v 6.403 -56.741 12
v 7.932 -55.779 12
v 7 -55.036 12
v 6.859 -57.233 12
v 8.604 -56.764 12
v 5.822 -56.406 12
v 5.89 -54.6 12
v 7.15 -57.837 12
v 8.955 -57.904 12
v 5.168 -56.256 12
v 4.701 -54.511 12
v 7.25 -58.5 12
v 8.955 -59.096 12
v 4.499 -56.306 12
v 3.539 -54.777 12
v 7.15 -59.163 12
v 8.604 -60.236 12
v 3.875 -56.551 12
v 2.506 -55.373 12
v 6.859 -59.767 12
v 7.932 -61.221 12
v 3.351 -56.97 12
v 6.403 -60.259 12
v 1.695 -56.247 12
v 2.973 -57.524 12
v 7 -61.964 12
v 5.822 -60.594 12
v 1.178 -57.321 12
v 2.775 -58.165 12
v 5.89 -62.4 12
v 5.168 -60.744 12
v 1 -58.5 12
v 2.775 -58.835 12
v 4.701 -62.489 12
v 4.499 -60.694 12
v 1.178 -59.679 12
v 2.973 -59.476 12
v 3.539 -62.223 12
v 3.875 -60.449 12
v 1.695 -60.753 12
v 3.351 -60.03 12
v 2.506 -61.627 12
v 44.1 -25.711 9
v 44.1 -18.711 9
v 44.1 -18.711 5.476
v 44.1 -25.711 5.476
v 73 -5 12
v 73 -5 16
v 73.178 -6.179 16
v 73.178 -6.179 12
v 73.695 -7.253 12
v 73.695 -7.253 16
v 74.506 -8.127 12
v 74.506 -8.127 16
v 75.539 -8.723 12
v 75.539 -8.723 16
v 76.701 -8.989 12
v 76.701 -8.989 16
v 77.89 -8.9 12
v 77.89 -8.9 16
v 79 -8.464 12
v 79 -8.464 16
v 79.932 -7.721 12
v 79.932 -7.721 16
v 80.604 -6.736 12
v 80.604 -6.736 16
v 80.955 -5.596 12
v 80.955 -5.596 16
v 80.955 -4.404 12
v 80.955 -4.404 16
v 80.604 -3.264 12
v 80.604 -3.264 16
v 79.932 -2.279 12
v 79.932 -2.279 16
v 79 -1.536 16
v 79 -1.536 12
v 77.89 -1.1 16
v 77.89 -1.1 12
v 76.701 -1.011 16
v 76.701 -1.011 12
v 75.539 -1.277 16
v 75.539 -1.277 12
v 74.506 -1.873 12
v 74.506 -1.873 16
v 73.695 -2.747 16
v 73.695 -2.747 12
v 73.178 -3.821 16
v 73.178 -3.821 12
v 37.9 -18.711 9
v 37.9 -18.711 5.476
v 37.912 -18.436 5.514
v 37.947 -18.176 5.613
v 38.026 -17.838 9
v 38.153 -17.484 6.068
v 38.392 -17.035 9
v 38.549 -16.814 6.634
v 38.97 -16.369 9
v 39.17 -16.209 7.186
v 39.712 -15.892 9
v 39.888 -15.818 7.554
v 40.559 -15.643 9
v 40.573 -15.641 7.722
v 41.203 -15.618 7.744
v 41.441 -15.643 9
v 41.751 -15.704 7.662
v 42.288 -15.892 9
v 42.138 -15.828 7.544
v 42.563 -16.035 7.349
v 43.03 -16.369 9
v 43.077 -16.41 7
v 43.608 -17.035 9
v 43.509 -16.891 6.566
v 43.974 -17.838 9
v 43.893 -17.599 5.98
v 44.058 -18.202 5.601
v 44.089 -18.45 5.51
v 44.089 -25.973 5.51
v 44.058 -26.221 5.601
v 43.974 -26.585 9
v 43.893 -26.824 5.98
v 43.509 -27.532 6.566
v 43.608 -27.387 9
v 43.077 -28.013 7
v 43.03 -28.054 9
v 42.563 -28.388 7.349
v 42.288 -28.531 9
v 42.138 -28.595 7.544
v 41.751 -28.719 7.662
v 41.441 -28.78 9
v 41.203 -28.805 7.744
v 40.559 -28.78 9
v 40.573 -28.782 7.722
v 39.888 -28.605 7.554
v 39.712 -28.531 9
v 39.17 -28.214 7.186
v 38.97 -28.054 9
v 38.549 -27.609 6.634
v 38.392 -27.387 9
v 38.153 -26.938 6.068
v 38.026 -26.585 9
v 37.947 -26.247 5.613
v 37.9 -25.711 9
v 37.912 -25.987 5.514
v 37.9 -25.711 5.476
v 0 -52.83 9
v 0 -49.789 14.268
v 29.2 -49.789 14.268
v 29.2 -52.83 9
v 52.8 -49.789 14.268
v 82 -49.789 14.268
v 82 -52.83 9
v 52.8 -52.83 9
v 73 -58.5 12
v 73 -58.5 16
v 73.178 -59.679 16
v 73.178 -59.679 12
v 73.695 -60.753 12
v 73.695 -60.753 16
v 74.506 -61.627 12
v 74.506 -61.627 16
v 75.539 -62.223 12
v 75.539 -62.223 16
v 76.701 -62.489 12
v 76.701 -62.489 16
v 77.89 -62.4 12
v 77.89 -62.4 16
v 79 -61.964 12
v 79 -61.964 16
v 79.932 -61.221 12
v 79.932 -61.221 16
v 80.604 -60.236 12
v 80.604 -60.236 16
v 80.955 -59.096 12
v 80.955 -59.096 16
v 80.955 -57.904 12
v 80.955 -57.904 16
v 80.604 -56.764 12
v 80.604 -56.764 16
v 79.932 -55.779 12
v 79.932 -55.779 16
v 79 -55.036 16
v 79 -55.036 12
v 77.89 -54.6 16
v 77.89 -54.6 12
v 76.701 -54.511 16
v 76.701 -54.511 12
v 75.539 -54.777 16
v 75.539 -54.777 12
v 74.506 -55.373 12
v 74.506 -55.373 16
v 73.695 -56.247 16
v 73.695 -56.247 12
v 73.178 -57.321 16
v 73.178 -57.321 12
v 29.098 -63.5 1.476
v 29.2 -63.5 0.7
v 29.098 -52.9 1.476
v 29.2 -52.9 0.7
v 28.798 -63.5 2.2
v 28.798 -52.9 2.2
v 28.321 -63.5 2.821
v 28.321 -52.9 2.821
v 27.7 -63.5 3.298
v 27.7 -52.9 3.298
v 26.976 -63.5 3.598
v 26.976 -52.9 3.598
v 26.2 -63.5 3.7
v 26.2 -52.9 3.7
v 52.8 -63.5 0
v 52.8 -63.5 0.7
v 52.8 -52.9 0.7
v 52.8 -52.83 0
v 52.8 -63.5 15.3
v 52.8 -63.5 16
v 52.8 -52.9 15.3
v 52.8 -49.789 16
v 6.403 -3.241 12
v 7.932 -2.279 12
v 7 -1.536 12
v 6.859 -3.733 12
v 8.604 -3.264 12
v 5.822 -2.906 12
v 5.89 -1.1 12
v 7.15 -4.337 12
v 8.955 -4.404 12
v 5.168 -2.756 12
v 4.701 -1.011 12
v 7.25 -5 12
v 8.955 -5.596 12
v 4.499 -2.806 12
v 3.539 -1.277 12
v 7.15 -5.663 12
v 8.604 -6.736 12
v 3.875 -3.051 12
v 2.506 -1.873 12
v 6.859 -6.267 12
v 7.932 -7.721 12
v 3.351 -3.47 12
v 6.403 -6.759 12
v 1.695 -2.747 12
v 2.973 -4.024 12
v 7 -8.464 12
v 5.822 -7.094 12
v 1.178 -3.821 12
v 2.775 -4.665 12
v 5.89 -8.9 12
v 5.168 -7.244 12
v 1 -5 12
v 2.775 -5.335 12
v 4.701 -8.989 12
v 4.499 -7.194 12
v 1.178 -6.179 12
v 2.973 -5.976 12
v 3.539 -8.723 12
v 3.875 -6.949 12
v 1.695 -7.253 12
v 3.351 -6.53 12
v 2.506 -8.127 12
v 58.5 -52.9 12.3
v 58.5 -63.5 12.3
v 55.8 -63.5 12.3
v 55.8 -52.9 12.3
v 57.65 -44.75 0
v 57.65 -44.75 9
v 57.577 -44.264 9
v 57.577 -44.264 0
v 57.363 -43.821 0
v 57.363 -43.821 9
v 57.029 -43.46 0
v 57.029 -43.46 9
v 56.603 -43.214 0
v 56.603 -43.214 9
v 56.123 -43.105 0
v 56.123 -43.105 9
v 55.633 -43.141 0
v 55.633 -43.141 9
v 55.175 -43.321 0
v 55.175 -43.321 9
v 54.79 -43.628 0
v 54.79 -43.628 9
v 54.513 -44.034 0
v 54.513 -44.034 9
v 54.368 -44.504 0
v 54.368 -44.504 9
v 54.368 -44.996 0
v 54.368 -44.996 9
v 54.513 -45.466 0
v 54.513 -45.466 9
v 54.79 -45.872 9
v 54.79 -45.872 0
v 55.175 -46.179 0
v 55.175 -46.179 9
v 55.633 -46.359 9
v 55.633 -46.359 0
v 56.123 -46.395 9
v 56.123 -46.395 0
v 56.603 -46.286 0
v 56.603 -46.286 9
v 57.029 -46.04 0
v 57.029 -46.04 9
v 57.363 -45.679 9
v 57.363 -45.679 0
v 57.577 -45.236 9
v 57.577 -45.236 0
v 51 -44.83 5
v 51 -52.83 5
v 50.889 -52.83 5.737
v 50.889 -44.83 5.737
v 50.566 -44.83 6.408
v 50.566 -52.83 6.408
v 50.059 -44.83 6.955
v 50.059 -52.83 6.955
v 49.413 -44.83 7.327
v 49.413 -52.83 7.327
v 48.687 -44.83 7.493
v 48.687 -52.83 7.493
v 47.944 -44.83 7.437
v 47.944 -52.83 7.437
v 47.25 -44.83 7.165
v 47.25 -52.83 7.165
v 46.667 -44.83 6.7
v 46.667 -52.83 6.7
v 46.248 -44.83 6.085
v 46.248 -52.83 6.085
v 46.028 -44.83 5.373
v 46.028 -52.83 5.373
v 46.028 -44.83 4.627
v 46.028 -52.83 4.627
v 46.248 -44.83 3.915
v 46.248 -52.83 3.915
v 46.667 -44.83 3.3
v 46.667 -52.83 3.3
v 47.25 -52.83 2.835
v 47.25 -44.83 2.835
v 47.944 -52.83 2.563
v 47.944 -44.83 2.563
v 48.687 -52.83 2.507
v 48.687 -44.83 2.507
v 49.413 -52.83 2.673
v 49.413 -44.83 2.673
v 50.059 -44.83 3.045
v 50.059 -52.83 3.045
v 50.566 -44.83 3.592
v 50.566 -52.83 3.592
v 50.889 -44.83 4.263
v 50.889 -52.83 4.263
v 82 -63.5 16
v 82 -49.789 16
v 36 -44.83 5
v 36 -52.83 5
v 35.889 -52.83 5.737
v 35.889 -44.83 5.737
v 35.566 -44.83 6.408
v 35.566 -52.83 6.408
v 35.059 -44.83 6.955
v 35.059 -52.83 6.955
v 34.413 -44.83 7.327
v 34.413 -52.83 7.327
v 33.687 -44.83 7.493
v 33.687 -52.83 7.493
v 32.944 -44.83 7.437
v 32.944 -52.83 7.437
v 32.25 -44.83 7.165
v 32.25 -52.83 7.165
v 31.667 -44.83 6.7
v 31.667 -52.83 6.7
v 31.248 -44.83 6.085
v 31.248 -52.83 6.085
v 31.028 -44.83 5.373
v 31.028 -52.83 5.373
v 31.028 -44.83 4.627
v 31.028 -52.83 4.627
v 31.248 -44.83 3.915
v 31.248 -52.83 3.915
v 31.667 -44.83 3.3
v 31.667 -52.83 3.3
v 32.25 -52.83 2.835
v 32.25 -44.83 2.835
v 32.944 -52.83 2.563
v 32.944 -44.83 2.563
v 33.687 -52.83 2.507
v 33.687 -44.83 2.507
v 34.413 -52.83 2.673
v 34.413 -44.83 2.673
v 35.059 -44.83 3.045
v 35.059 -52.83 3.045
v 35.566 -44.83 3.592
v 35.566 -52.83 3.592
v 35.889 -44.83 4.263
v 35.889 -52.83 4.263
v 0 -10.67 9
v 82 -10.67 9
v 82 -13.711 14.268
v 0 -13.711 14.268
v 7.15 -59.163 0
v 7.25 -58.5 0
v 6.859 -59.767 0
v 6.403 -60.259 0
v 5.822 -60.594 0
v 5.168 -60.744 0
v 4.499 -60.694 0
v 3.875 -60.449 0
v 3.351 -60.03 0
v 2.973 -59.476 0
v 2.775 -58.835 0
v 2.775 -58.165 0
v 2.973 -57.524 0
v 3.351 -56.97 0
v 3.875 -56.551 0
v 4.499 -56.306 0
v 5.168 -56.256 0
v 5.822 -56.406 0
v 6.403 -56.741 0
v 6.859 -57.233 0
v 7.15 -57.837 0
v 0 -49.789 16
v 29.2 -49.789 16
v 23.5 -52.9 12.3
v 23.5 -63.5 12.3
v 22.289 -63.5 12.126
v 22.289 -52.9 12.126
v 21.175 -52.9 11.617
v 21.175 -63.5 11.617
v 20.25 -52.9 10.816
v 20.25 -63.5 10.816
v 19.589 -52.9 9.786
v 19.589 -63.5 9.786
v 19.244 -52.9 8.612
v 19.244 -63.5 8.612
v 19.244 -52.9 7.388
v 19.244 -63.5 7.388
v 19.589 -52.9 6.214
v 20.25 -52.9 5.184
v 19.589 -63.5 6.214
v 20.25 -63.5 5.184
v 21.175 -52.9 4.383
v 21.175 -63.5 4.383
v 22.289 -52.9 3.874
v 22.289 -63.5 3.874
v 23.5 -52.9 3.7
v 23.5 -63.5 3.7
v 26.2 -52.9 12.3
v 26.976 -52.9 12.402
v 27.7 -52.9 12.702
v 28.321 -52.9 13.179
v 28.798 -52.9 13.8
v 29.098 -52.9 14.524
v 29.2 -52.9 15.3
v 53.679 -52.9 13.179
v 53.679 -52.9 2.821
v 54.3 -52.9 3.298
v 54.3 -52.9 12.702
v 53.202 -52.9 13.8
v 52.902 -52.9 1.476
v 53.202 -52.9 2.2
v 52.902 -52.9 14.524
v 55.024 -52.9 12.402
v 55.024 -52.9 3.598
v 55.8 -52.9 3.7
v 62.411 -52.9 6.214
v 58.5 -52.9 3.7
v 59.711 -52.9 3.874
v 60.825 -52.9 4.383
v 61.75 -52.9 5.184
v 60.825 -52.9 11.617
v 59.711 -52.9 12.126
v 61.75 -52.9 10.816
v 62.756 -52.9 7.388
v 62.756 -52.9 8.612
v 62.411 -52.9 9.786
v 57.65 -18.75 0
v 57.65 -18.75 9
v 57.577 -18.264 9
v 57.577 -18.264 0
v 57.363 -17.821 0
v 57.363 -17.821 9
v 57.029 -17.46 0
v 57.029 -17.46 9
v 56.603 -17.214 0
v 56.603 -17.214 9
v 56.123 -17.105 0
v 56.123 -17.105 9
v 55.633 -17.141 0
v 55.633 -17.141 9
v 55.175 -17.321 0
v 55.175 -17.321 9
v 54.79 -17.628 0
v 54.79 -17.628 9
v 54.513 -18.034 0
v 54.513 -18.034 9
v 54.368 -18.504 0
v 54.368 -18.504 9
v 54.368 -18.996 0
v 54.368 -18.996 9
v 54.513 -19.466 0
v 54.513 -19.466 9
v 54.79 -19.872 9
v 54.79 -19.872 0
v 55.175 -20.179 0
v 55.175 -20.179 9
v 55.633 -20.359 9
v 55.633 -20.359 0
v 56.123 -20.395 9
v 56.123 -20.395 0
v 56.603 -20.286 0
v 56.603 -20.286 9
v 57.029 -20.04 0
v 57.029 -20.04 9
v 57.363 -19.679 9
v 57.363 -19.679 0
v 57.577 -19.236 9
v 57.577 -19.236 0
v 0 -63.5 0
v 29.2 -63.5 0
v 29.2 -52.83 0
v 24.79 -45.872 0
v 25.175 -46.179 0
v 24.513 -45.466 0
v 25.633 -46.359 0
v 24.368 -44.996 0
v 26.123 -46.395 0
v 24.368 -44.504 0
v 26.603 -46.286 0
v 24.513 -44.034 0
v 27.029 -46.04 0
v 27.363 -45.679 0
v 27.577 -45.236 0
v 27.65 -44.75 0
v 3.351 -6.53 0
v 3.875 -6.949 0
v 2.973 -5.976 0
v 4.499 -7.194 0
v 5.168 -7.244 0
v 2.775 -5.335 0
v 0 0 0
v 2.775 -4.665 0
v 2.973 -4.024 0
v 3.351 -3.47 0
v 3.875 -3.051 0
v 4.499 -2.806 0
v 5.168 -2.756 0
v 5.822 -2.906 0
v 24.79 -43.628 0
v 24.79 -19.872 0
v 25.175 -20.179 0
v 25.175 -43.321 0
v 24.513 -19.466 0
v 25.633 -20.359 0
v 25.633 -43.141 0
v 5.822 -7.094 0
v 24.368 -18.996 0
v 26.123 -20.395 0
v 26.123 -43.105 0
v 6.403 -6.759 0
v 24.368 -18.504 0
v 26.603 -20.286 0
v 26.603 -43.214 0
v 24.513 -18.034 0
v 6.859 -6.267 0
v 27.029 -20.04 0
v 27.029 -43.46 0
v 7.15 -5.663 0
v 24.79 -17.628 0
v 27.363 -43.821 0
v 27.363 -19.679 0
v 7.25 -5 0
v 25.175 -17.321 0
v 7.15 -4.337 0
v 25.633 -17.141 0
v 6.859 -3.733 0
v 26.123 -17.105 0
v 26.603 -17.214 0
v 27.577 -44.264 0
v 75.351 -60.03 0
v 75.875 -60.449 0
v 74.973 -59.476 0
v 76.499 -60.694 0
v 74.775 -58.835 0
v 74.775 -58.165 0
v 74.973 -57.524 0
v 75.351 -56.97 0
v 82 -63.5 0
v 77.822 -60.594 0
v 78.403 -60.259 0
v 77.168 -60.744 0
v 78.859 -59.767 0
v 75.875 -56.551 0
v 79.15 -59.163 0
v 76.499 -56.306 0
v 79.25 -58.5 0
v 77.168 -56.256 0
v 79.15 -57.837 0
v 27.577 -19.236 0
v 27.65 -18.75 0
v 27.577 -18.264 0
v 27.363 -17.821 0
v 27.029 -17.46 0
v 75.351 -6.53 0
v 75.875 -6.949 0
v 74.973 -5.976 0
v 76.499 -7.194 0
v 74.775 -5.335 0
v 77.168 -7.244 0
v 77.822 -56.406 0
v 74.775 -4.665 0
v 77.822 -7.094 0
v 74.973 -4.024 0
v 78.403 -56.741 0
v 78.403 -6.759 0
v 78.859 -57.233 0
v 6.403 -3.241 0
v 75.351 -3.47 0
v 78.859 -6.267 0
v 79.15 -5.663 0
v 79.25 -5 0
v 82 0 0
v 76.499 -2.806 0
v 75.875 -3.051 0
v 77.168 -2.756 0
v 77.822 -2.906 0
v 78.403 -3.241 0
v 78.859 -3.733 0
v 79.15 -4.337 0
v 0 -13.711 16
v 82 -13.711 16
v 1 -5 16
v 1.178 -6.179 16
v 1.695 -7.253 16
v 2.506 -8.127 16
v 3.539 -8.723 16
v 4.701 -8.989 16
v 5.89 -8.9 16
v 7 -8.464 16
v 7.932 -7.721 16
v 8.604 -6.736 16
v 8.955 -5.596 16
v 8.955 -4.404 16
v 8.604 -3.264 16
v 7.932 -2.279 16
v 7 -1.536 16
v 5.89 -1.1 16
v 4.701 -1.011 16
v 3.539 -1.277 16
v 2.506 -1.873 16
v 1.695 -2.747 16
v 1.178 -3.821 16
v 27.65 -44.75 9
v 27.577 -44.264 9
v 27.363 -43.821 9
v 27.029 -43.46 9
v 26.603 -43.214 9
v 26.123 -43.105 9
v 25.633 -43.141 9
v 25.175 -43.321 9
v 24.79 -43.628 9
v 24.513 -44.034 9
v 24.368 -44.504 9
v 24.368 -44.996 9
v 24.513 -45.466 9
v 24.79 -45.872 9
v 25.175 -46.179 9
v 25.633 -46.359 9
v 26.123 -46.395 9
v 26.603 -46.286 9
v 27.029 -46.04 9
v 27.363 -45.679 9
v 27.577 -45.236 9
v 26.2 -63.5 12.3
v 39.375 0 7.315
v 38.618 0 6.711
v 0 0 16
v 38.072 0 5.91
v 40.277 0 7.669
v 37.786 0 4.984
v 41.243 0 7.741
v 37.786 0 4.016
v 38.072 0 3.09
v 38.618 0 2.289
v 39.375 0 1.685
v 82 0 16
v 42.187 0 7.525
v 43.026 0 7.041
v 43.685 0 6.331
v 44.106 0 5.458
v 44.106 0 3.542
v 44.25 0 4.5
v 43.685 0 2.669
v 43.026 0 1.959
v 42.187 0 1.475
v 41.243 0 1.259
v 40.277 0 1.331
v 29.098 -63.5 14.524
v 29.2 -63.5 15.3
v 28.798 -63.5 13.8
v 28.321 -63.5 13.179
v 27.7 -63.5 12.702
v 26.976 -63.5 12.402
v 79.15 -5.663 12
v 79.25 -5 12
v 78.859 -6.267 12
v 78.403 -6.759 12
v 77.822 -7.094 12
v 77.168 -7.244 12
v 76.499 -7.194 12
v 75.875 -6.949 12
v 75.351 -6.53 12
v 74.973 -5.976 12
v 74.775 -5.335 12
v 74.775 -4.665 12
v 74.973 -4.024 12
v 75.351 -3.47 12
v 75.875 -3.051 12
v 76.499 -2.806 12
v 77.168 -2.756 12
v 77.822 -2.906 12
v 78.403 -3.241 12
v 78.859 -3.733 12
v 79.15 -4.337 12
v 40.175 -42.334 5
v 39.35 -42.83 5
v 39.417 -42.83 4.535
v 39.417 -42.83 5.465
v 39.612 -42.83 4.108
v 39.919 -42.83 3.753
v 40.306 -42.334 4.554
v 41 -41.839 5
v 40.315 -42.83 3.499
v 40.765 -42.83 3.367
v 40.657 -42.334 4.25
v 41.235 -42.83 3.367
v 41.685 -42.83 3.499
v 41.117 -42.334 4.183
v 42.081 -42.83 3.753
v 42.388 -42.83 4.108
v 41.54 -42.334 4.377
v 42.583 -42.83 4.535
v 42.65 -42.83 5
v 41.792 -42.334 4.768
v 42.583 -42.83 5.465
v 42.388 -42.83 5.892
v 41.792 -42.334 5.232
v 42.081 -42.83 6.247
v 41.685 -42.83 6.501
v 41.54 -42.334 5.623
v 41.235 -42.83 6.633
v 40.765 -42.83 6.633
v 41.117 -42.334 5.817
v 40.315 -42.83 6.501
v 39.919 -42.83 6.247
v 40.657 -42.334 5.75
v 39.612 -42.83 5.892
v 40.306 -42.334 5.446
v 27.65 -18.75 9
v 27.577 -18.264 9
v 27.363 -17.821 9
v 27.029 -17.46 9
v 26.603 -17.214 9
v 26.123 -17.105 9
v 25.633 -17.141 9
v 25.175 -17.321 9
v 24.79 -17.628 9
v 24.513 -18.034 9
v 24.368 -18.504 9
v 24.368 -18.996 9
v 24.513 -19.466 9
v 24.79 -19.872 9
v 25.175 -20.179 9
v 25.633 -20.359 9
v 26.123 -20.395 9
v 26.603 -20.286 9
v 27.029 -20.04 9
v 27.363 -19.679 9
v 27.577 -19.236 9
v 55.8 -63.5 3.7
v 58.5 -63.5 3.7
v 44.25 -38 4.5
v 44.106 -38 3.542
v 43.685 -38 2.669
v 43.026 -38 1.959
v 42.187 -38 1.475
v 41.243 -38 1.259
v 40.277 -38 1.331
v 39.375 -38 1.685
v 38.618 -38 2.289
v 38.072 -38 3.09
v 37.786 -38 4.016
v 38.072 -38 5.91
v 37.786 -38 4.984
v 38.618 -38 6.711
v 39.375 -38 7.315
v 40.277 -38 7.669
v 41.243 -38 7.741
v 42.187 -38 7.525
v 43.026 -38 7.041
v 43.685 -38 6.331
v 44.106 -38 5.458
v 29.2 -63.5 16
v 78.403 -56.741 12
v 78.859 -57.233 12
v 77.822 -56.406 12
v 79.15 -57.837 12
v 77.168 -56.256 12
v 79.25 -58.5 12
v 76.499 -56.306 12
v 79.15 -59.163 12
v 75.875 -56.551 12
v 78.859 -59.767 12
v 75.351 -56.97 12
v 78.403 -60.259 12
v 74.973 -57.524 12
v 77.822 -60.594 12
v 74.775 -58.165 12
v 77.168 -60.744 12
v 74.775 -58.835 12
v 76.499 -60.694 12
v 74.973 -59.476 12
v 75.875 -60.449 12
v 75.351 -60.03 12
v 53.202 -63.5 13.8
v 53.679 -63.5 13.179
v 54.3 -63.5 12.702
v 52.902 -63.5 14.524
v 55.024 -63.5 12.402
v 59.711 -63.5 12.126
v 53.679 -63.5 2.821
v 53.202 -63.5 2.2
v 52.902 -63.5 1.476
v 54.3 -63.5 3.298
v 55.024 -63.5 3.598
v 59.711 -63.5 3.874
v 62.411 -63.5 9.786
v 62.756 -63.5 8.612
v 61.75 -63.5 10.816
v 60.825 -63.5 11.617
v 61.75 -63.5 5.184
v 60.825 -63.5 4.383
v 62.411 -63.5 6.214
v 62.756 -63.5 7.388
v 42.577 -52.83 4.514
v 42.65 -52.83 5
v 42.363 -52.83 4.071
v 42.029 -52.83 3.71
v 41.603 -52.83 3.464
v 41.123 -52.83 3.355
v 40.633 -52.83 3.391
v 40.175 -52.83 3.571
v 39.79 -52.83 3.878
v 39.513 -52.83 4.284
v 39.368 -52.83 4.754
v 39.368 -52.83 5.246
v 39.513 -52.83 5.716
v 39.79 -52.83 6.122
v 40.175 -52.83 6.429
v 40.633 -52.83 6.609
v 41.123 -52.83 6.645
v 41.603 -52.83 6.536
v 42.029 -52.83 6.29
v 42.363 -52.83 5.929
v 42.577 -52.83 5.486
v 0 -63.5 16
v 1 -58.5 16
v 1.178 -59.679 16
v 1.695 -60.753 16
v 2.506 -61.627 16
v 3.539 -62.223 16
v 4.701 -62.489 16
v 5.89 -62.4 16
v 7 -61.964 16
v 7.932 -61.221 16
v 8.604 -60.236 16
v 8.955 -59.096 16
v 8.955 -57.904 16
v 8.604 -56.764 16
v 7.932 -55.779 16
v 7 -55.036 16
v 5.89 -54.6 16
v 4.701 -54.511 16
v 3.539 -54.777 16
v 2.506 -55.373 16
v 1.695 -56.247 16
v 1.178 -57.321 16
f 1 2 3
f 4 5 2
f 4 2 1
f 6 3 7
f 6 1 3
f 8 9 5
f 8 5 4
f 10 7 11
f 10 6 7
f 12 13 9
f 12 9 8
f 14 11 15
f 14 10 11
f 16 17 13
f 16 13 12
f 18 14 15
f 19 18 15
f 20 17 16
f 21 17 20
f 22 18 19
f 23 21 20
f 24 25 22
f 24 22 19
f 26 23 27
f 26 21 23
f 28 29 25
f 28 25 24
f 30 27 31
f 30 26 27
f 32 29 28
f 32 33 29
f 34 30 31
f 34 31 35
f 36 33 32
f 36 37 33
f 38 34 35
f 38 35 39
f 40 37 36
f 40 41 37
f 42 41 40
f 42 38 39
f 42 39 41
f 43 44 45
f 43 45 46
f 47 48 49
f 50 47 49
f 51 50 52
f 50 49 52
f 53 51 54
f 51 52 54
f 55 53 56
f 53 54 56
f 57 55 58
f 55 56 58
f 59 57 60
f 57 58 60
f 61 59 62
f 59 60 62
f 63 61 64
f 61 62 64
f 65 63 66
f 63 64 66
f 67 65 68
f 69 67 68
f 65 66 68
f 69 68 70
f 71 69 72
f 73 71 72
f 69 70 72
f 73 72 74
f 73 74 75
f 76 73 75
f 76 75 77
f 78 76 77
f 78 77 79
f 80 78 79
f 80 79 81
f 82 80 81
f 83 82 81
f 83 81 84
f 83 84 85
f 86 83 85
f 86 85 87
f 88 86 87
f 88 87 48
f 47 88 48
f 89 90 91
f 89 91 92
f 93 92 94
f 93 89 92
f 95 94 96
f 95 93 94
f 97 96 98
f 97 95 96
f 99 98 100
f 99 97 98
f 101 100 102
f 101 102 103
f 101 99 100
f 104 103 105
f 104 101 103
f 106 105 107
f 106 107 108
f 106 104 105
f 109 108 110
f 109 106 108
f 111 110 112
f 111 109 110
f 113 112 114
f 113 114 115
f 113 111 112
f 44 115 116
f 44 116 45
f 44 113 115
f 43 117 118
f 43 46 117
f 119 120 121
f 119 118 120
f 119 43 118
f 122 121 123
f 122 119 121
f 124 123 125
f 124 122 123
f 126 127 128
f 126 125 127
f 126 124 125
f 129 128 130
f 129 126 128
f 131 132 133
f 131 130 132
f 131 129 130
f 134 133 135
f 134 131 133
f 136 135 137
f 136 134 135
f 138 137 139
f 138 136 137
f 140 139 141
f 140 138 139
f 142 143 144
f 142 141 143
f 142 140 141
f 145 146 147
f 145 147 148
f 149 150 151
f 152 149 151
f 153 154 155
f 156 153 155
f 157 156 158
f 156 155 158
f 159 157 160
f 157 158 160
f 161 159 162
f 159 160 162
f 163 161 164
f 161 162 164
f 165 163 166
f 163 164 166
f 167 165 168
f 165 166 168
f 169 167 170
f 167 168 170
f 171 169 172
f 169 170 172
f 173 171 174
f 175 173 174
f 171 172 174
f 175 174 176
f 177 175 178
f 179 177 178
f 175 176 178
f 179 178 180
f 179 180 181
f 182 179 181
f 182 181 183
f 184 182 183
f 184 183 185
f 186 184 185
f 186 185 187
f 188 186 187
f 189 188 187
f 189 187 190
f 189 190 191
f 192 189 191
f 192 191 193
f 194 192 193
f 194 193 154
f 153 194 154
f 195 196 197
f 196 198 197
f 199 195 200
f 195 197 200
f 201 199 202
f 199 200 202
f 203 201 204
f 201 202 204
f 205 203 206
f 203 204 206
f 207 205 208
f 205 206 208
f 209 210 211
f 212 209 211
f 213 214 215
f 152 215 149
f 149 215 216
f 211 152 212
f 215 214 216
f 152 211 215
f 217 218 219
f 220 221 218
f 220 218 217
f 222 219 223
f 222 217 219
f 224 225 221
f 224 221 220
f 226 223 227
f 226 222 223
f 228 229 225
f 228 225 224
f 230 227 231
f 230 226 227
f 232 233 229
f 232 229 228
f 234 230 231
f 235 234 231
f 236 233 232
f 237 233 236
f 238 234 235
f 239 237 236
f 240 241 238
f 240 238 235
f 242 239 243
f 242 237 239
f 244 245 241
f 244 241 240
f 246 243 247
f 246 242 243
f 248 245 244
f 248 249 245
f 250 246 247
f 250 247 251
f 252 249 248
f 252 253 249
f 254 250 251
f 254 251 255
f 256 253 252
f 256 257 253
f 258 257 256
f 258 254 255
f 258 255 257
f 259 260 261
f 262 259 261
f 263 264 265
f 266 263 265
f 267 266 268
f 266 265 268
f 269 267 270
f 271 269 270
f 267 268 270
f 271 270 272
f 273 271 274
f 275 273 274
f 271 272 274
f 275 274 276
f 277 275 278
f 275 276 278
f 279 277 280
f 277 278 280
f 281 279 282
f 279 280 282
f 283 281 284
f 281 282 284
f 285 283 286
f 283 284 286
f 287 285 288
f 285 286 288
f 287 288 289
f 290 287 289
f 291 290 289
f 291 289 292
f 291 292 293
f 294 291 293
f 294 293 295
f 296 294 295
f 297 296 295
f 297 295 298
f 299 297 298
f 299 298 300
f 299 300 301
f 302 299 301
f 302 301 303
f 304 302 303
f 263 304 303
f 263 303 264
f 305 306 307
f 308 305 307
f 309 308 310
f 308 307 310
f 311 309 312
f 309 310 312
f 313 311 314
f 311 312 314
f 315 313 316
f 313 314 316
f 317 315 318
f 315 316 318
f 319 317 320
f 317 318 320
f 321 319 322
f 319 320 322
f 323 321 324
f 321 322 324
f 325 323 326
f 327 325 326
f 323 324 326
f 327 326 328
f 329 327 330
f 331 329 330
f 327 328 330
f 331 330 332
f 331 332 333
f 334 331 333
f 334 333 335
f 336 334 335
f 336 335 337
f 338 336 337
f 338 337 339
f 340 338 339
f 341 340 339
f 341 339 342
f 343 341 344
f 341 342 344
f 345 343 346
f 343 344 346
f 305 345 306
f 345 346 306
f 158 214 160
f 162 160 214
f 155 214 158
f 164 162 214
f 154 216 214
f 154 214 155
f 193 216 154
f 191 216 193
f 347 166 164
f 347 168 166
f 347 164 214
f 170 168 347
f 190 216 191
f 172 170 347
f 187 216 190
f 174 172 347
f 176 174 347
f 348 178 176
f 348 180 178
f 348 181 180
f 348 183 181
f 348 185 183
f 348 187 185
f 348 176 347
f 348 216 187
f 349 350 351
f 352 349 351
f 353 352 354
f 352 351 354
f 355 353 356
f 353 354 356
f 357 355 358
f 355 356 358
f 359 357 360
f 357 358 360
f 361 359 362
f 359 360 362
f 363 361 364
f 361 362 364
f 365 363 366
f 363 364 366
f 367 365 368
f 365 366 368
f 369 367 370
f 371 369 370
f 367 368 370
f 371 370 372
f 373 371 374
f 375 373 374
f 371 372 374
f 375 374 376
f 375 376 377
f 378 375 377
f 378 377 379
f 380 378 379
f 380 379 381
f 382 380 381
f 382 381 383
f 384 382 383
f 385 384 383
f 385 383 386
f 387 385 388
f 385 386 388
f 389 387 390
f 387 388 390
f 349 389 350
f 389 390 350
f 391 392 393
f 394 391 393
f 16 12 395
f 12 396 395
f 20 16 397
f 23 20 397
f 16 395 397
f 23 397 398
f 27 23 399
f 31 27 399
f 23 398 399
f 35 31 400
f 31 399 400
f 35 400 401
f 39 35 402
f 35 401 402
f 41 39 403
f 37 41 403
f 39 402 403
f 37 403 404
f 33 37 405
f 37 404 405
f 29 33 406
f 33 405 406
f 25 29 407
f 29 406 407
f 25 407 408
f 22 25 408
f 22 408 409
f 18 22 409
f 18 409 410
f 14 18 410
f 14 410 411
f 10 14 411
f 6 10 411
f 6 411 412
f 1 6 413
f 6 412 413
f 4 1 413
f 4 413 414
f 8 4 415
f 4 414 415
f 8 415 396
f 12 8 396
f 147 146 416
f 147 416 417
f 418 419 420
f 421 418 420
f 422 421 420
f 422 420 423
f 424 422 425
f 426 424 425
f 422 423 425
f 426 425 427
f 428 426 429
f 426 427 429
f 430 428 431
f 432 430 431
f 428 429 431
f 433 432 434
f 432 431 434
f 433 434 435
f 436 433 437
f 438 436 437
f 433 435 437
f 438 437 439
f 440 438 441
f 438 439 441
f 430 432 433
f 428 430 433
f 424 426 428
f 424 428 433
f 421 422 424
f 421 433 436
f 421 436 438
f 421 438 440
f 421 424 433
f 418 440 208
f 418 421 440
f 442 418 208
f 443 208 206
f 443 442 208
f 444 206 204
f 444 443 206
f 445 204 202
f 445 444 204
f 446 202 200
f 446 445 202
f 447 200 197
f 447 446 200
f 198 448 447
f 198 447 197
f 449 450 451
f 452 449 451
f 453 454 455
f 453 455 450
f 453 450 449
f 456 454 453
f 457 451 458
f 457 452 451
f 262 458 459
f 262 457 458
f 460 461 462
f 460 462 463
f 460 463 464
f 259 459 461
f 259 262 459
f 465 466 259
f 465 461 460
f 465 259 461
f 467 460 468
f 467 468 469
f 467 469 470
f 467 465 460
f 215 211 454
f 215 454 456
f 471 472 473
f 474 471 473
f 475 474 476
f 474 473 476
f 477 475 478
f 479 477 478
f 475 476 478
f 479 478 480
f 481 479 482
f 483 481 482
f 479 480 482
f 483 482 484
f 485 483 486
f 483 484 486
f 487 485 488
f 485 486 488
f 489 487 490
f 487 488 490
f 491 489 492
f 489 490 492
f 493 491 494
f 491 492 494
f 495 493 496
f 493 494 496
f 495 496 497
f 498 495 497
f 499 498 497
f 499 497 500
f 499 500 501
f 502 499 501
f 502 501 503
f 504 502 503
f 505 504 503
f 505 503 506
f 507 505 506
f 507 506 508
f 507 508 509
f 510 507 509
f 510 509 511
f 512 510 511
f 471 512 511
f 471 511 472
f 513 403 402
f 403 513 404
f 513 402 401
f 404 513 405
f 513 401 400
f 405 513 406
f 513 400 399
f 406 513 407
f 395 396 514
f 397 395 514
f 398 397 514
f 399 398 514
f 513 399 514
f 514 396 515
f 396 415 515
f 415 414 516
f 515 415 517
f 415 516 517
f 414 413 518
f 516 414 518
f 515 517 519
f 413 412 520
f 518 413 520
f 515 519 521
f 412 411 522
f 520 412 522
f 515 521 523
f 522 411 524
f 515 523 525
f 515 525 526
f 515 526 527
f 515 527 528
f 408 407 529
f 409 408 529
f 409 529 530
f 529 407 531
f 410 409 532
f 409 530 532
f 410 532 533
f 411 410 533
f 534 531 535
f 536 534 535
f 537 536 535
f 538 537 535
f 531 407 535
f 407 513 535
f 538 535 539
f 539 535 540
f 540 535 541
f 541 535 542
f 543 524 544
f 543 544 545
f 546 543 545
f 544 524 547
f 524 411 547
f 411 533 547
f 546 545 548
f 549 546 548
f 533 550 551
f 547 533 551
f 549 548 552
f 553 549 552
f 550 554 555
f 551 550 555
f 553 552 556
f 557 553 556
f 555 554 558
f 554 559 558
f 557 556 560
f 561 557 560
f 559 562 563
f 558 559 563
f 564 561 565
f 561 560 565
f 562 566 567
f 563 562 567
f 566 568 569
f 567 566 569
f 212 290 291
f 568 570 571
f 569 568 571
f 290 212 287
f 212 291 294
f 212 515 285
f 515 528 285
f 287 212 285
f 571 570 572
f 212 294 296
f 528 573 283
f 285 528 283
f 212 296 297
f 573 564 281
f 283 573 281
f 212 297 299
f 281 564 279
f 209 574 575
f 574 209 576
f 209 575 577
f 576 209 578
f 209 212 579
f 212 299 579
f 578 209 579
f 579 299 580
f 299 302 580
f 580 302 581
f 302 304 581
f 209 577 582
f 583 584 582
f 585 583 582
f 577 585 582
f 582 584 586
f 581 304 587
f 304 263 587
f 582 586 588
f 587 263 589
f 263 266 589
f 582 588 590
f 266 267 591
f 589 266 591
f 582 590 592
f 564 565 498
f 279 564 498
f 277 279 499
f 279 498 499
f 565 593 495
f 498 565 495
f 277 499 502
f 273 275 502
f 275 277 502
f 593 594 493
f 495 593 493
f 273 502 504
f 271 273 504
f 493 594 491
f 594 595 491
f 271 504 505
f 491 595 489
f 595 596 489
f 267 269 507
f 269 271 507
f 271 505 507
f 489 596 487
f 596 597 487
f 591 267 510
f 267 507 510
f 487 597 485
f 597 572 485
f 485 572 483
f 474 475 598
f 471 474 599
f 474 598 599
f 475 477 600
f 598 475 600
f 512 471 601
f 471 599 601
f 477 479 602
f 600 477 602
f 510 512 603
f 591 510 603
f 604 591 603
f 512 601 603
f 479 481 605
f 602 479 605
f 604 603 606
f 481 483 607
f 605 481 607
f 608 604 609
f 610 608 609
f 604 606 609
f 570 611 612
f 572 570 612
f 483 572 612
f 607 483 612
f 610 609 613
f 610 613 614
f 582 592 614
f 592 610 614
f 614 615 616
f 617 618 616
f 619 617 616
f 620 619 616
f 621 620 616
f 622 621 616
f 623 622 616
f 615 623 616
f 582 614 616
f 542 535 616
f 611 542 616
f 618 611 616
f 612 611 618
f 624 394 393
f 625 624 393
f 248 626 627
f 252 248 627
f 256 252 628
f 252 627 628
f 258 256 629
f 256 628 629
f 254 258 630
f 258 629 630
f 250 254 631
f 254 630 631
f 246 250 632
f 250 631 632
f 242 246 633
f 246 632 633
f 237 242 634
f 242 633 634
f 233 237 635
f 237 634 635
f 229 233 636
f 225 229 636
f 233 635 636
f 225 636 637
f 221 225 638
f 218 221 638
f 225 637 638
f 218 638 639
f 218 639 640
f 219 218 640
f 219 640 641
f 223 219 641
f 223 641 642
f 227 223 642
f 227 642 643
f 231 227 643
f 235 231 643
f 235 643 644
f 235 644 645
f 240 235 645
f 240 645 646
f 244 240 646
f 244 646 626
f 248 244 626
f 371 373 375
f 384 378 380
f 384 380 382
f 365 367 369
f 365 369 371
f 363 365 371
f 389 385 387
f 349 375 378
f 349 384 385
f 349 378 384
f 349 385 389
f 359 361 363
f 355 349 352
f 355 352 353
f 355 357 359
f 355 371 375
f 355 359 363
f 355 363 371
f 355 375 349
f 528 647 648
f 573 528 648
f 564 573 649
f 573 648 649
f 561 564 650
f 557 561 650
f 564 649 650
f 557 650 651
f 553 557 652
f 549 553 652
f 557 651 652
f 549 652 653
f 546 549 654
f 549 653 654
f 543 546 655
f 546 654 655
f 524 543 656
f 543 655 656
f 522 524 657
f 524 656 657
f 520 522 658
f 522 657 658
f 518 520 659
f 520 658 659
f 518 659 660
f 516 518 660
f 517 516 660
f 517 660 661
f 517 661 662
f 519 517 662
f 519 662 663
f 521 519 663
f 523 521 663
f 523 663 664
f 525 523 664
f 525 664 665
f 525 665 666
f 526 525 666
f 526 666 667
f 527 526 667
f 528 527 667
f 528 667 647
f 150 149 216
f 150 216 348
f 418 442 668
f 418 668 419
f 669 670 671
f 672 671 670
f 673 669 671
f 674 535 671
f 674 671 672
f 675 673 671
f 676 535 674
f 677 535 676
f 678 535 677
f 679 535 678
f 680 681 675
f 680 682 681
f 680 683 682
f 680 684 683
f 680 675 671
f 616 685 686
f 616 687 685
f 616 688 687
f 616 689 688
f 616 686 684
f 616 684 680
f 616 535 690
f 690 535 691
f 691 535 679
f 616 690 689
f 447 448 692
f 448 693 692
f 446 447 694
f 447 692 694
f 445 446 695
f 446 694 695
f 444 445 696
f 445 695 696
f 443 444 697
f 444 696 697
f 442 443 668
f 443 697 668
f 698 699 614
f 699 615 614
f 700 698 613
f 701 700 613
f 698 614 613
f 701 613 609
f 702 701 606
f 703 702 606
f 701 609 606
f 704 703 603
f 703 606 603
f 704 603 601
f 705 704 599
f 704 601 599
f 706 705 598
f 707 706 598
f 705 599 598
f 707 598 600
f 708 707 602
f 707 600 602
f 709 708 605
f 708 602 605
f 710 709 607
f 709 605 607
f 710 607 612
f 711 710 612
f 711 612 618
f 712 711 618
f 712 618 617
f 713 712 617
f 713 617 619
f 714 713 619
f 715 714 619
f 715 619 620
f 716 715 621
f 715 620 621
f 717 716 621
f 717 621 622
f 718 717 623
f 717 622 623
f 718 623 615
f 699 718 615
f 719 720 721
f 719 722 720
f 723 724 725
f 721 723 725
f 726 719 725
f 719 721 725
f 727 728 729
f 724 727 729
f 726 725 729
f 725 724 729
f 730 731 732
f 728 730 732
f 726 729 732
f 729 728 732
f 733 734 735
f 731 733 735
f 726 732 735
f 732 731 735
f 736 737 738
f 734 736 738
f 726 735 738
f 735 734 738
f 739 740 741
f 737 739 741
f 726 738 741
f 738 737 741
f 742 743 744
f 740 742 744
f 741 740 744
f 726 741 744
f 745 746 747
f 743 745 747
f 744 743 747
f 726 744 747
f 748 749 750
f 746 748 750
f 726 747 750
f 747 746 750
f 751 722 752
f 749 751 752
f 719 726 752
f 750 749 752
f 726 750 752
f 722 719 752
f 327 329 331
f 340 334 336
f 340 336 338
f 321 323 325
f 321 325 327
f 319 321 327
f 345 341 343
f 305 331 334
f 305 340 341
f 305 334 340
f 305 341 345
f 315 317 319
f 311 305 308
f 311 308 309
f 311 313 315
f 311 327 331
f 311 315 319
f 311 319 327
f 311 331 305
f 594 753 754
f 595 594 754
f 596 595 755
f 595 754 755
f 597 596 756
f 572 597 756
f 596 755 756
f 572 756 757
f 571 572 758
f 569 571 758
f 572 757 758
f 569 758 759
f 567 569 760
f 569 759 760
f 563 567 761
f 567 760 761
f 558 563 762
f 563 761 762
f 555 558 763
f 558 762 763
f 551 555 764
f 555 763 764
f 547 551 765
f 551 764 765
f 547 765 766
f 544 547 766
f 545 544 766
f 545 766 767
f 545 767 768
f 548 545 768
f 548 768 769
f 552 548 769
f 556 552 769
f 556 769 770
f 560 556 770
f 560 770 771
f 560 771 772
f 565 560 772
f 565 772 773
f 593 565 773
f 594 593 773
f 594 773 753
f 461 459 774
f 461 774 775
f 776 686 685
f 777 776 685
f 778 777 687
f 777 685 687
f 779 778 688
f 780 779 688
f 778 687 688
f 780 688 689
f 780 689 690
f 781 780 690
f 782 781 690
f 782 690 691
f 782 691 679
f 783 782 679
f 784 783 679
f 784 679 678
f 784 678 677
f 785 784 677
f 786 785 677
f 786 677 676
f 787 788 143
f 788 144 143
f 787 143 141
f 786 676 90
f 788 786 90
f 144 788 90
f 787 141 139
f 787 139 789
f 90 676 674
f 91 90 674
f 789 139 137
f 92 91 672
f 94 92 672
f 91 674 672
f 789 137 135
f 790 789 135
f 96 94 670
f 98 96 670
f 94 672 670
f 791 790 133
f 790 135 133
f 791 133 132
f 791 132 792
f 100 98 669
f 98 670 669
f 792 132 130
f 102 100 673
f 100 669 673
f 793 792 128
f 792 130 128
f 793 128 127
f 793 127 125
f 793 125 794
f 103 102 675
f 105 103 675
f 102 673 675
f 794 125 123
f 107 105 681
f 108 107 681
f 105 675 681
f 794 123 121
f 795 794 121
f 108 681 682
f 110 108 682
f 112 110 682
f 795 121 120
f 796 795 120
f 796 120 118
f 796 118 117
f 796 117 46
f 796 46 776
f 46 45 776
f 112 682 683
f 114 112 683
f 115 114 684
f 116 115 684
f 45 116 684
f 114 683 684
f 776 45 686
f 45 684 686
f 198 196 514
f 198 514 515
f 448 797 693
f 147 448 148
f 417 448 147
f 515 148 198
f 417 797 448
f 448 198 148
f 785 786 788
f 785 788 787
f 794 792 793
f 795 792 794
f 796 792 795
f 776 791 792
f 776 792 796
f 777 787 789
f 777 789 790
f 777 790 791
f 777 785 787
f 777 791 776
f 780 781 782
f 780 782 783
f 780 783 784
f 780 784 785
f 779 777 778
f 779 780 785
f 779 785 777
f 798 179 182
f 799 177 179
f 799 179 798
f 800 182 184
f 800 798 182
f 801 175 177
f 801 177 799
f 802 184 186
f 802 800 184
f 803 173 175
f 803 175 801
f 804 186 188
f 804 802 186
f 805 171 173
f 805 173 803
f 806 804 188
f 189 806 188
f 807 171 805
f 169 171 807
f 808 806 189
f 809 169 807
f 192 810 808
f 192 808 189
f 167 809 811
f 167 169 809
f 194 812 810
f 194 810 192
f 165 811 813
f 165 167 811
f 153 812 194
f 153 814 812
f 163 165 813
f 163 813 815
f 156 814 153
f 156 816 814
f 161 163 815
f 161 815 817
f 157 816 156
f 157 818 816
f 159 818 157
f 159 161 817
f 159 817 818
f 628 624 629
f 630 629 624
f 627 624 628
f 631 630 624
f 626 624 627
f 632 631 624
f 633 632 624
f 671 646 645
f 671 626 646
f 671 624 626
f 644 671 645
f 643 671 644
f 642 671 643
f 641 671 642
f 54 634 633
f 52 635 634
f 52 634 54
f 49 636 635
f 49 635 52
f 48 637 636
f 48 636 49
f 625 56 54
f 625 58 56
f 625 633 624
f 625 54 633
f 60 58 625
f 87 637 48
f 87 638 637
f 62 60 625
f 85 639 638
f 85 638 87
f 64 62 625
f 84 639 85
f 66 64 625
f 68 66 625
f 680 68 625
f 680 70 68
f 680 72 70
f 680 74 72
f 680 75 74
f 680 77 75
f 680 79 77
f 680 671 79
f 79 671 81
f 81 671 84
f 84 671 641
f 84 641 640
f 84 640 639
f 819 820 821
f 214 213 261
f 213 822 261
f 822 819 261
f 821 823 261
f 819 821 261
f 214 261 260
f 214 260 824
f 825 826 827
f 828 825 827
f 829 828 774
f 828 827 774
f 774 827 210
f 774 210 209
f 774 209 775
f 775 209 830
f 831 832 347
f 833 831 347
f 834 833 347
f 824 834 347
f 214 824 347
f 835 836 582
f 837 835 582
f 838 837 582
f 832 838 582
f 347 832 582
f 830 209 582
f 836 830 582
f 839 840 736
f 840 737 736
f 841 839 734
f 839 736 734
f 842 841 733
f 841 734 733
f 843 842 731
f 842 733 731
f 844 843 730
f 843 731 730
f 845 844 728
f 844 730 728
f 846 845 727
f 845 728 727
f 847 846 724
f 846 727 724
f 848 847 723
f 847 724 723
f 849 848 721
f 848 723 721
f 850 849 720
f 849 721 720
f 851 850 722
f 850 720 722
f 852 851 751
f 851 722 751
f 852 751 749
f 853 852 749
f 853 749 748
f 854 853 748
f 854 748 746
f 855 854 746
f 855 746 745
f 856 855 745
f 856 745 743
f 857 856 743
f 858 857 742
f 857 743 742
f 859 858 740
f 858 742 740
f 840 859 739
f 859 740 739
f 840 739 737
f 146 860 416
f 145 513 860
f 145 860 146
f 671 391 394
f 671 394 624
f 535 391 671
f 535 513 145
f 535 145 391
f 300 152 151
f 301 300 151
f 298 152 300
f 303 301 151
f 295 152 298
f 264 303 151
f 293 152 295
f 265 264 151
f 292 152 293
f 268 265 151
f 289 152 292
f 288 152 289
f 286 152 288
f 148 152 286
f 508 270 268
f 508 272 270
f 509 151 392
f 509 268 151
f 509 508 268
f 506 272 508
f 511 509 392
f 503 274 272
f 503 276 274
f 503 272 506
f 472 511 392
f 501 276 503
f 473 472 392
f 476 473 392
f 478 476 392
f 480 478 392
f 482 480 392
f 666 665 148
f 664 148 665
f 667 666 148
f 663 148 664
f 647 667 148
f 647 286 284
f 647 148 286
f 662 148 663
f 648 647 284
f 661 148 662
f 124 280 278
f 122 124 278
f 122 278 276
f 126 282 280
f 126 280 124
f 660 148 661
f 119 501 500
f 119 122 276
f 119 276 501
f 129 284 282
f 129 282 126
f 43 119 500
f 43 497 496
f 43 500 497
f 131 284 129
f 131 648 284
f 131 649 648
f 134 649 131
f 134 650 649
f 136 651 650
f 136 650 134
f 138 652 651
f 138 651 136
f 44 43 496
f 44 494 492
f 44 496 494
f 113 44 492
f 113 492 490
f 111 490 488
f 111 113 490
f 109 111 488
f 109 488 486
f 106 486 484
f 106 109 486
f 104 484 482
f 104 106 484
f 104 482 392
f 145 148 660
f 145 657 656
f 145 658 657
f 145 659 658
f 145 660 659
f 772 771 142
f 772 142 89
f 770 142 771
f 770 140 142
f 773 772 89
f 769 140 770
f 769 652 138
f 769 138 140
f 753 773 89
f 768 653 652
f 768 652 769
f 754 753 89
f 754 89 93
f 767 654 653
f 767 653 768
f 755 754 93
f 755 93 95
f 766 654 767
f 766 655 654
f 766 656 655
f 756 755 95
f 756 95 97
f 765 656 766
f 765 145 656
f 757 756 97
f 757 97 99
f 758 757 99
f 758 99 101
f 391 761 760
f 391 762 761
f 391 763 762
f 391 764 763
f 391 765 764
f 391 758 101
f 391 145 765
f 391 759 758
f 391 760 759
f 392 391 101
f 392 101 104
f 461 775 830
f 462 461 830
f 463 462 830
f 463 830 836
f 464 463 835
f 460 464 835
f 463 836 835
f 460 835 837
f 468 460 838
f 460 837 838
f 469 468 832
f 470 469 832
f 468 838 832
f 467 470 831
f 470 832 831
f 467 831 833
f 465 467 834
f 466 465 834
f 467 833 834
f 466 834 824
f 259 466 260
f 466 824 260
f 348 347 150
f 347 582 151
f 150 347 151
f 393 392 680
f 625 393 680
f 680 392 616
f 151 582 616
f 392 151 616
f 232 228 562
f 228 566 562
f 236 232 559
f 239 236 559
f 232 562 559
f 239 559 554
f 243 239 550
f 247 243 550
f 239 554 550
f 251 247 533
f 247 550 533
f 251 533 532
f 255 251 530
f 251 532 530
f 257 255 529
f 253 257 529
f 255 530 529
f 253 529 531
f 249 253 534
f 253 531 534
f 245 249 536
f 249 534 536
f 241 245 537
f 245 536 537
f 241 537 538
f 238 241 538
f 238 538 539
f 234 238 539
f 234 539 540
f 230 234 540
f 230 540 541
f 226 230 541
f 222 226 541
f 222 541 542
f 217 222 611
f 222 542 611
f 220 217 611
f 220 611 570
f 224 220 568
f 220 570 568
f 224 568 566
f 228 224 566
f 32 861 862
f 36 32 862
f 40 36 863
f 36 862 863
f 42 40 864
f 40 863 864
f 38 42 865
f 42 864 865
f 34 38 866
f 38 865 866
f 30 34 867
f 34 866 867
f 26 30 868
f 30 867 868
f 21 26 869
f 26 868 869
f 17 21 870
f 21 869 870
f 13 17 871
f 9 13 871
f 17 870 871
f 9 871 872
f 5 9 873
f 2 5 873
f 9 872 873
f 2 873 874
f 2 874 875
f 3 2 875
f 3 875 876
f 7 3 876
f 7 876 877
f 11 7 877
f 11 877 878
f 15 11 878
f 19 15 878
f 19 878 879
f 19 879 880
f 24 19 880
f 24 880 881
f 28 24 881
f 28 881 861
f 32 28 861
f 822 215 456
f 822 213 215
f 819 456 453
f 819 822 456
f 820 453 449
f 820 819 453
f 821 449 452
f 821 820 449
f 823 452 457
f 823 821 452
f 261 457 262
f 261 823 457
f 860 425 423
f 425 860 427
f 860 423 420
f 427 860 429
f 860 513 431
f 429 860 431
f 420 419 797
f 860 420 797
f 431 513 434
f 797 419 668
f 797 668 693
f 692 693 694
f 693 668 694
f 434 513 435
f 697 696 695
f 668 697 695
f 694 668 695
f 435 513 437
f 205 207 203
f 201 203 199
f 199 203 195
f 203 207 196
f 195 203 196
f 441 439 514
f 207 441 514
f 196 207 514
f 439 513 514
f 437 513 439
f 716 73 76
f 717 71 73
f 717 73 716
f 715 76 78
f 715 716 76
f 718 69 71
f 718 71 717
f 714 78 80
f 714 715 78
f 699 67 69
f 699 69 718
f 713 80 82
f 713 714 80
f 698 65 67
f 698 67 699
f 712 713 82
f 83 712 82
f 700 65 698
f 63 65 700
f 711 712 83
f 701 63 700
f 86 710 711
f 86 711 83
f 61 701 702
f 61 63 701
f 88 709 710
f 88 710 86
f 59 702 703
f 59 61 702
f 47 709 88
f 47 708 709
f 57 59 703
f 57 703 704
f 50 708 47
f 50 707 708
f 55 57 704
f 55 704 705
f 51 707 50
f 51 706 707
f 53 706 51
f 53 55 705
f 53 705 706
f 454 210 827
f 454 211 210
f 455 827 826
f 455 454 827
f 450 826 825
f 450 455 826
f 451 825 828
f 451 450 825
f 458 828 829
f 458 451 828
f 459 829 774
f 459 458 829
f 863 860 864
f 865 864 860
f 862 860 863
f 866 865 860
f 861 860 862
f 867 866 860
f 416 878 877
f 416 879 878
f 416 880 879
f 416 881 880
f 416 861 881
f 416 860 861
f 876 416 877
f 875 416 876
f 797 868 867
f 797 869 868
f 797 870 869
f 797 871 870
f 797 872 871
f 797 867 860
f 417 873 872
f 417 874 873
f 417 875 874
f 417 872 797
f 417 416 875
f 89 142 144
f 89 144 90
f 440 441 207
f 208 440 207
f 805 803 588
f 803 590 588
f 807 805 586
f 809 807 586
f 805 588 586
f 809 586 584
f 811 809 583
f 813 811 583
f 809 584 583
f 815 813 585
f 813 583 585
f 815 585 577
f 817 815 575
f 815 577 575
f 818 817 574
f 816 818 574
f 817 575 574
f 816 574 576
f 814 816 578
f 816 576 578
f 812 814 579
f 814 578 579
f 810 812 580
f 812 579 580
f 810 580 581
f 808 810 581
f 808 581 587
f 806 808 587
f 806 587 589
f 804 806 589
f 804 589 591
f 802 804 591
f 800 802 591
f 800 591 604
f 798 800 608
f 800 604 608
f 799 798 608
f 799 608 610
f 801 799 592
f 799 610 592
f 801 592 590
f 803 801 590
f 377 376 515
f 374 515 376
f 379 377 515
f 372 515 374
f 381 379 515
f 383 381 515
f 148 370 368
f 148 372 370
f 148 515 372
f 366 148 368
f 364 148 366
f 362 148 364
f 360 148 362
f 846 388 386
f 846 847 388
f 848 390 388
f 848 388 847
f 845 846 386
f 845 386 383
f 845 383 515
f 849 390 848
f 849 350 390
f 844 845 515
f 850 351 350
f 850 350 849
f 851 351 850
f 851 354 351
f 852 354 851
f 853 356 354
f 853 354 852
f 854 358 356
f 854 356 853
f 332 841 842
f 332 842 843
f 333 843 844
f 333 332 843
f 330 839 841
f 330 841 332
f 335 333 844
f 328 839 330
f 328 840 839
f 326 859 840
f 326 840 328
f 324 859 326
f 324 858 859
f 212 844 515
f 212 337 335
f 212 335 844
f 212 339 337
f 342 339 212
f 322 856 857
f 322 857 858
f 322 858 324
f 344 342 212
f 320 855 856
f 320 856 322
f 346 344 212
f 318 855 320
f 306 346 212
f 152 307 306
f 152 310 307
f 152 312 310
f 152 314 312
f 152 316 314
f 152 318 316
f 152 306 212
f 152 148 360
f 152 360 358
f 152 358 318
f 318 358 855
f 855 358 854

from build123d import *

# Parameters (mm, degrees)
SKETCH_1_W                  = 82
SKETCH_1_H                  = 63.5
EXTRUDE_1_DEPTH             = 16
CUT_EXTRUDE_1_DEPTH         = 83
SKETCH_15_W                 = 23.6
SKETCH_15_H                 = 14.711451884
CUT_EXTRUDE_4_DEPTH         = 7
SKETCH_16_W                 = 23.6
SKETCH_16_H                 = 10.67
CUT_EXTRUDE_5_DEPTH         = 9
SKETCH_17_R                 = 2.5
CUT_EXTRUDE_6_DEPTH         = 8
M4X0_72_D                   = 3.3
M4X0_72_DEPTH               = 10
M4X0_72_TIP                 = 0.991420021
CUT_EXTRUDE_7_DEPTH         = 4
SKETCH_26_R                 = 3.25
CUT_EXTRUDE_8_DEPTH         = 38
HOLE_WIZARD_M41_D           = 4.5
HOLE_WIZARD_M41_CBORE_D     = 8
HOLE_WIZARD_M41_CBORE_DEPTH = 4
CHAMFER_2_SIZE              = 1
CHAMFER_2_SIZE2             = 2
CHAMFER_2_PART_2_SIZE       = 1
CHAMFER_2_PART_2_SIZE2      = 2
CHAMFER_2_PART_3_SIZE       = 1
CHAMFER_2_PART_3_SIZE2      = 2
CUT_EXTRUDE_12_DEPTH        = 10.6
FILLET_1_R                  = 3
M4X0_73_D                   = 3.3


with BuildPart() as part:
    # Эскиз1 → Бобышка-Вытянуть1 (new body)
    with BuildSketch(Plane.XY):
        with Locations((41, -31.75)):
            Rectangle(SKETCH_1_W, SKETCH_1_H)
    extrude(amount=EXTRUDE_1_DEPTH)

    # Эскиз2 → Вырез-Вытянуть1 (cut, through all)
    with BuildSketch(Plane.ZY):
        Polygon((9, -10.67), (16, -14.711451884), (16, -48.788548116), (9, -52.83), align=None)
    extrude(amount=-CUT_EXTRUDE_1_DEPTH, mode=Mode.SUBTRACT)

    # Эскиз15 → Вырез-Вытянуть4 (cut)
    with BuildSketch(Plane.XY.offset(16)):
        with Locations((41, -56.144274058)):
            Rectangle(SKETCH_15_W, SKETCH_15_H)
    extrude(amount=-CUT_EXTRUDE_4_DEPTH, mode=Mode.SUBTRACT)

    # Эскиз16 → Вырез-Вытянуть5 (cut)
    with BuildSketch(Plane.XY.offset(9)):
        with Locations((41, -58.165)):
            Rectangle(SKETCH_16_W, SKETCH_16_H)
    extrude(amount=-CUT_EXTRUDE_5_DEPTH, mode=Mode.SUBTRACT)

    # Эскиз17 → Вырез-Вытянуть6 (cut)
    with BuildSketch(Plane.XZ.offset(52.83)):
        with Locations((33.5, 5)):
            Circle(SKETCH_17_R)
        with Locations((48.5, 5)):
            Circle(SKETCH_17_R)
    extrude(amount=-CUT_EXTRUDE_6_DEPTH, mode=Mode.SUBTRACT)

    # Отверстие обработанное метчиком M4x0.72
    with Locations(Plane(origin=(0, -52.83, 0), x_dir=(-1, 0, 0), z_dir=(0, -1, 0))):
        with Locations((-41, -5)):
            Hole(M4X0_72_D / 2, depth=M4X0_72_DEPTH)
            with Locations((0, 0, -(M4X0_72_DEPTH + M4X0_72_TIP / 2))):  # 118° drill point
                Cone(0, M4X0_72_D / 2, M4X0_72_TIP, mode=Mode.SUBTRACT)

    # Эскиз25 → Вырез-Вытянуть7 (cut)
    with BuildSketch(Plane.XY.offset(9)):
        with BuildLine():
            Line((44.1, -18.711451884), (44.1, -25.711451884))
            ThreePointArc((44.1, -25.711451884), (41, -28.811451884), (37.9, -25.711451884))
            Line((37.9, -25.711451884), (37.9, -18.711451884))
            ThreePointArc((37.9, -18.711451884), (41, -15.611451884), (44.1, -18.711451884))
        make_face()
    extrude(amount=-CUT_EXTRUDE_7_DEPTH, mode=Mode.SUBTRACT)

    # Эскиз26 → Вырез-Вытянуть8 (cut)
    with BuildSketch(Plane(origin=(0, 0, 0), x_dir=(1, 0, 0), z_dir=(0, 1, 0))):
        with Locations((41, -4.5)):
            Circle(SKETCH_26_R)
    extrude(amount=-CUT_EXTRUDE_8_DEPTH, mode=Mode.SUBTRACT)

    # Цековка для винта с внутренним шестигранником M41 (through all)
    with Locations(Plane(origin=(30.759227947, 26.793365177, 16), x_dir=(-1, 0, 0), z_dir=(0, 0, 1))):
        with Locations((-46.240772053, 31.793365177), (-46.240772053, 85.293365177), (25.759227947, 85.293365177), (25.759227947, 31.793365177)):
            CounterBoreHole(HOLE_WIZARD_M41_D / 2, HOLE_WIZARD_M41_CBORE_D / 2, HOLE_WIZARD_M41_CBORE_DEPTH)

    # Фаска2
    chamfer_2_edges = [part.edges().sort_by_distance(p)[0] for p in [
        (41, -14.711451884, 16),
    ]]
    chamfer_2_side = [part.faces().sort_by_distance(p)[0] for p in [
        (41, -7.569889145, 16),
    ]]
    chamfer(chamfer_2_edges, length=CHAMFER_2_SIZE, length2=CHAMFER_2_SIZE2, reference=chamfer_2_side[0])

    # Фаска2 part 2
    chamfer_2_part_2_edges = [part.edges().sort_by_distance(p)[0] for p in [
        (67.4, -48.788548116, 16),
    ]]
    chamfer_2_part_2_side = [part.faces().sort_by_distance(p)[0] for p in [
        (66.127821531, -55.832096576, 16),
    ]]
    chamfer(chamfer_2_part_2_edges, length=CHAMFER_2_PART_2_SIZE, length2=CHAMFER_2_PART_2_SIZE2, reference=chamfer_2_part_2_side[0])

    # Фаска2 part 3
    chamfer_2_part_3_edges = [part.edges().sort_by_distance(p)[0] for p in [
        (14.6, -48.788548116, 16),
    ]]
    chamfer_2_part_3_side = [part.faces().sort_by_distance(p)[0] for p in [
        (15.872178469, -55.832096576, 16),
    ]]
    chamfer(chamfer_2_part_3_edges, length=CHAMFER_2_PART_3_SIZE, length2=CHAMFER_2_PART_3_SIZE2, reference=chamfer_2_part_3_side[0])

    # Эскиз32 → Вырез-Вытянуть12 (cut)
    with BuildSketch(Plane.XZ.offset(63.5)):
        with BuildLine():
            Line((52.7, -0.2), (52.7, 3.7))
            Line((52.7, 3.7), (58.5, 3.7))
            ThreePointArc((58.5, 3.7), (62.8, 8), (58.5, 12.3))
            Line((58.5, 12.3), (52.7, 12.3))
            Line((52.7, 12.3), (52.7, 16.2))
            Line((52.7, 16.2), (29.3, 16.2))
            Line((29.3, 16.2), (29.3, 12.3))
            Line((29.3, 12.3), (23.5, 12.3))
            ThreePointArc((23.5, 12.3), (19.2, 8), (23.5, 3.7))
            Line((23.5, 3.7), (29.3, 3.7))
            Line((29.3, 3.7), (29.3, -0.2))
            Line((29.3, -0.2), (52.7, -0.2))
        make_face()
    extrude(amount=-CUT_EXTRUDE_12_DEPTH, mode=Mode.SUBTRACT)

    # Скругление1
    fillet_1_edges = [part.edges().sort_by_distance(p)[0] for p in [
        (52.8, -58.2, 3.7),
        (52.8, -58.2, 12.3),
        (29.2, -58.2, 12.3),
        (29.2, -58.2, 3.7),
    ]]
    fillet(fillet_1_edges, radius=FILLET_1_R)

    # Отверстие обработанное метчиком M4x0.73 (through all)
    with Locations(Plane(origin=(0, 0, 0), x_dir=(-1, 0, 0), z_dir=(0, 0, -1))):
        with Locations((-26, -44.75), (-26, -18.75), (-56, -18.75), (-56, -44.75)):
            Hole(M4X0_73_D / 2)


solid = part.part
